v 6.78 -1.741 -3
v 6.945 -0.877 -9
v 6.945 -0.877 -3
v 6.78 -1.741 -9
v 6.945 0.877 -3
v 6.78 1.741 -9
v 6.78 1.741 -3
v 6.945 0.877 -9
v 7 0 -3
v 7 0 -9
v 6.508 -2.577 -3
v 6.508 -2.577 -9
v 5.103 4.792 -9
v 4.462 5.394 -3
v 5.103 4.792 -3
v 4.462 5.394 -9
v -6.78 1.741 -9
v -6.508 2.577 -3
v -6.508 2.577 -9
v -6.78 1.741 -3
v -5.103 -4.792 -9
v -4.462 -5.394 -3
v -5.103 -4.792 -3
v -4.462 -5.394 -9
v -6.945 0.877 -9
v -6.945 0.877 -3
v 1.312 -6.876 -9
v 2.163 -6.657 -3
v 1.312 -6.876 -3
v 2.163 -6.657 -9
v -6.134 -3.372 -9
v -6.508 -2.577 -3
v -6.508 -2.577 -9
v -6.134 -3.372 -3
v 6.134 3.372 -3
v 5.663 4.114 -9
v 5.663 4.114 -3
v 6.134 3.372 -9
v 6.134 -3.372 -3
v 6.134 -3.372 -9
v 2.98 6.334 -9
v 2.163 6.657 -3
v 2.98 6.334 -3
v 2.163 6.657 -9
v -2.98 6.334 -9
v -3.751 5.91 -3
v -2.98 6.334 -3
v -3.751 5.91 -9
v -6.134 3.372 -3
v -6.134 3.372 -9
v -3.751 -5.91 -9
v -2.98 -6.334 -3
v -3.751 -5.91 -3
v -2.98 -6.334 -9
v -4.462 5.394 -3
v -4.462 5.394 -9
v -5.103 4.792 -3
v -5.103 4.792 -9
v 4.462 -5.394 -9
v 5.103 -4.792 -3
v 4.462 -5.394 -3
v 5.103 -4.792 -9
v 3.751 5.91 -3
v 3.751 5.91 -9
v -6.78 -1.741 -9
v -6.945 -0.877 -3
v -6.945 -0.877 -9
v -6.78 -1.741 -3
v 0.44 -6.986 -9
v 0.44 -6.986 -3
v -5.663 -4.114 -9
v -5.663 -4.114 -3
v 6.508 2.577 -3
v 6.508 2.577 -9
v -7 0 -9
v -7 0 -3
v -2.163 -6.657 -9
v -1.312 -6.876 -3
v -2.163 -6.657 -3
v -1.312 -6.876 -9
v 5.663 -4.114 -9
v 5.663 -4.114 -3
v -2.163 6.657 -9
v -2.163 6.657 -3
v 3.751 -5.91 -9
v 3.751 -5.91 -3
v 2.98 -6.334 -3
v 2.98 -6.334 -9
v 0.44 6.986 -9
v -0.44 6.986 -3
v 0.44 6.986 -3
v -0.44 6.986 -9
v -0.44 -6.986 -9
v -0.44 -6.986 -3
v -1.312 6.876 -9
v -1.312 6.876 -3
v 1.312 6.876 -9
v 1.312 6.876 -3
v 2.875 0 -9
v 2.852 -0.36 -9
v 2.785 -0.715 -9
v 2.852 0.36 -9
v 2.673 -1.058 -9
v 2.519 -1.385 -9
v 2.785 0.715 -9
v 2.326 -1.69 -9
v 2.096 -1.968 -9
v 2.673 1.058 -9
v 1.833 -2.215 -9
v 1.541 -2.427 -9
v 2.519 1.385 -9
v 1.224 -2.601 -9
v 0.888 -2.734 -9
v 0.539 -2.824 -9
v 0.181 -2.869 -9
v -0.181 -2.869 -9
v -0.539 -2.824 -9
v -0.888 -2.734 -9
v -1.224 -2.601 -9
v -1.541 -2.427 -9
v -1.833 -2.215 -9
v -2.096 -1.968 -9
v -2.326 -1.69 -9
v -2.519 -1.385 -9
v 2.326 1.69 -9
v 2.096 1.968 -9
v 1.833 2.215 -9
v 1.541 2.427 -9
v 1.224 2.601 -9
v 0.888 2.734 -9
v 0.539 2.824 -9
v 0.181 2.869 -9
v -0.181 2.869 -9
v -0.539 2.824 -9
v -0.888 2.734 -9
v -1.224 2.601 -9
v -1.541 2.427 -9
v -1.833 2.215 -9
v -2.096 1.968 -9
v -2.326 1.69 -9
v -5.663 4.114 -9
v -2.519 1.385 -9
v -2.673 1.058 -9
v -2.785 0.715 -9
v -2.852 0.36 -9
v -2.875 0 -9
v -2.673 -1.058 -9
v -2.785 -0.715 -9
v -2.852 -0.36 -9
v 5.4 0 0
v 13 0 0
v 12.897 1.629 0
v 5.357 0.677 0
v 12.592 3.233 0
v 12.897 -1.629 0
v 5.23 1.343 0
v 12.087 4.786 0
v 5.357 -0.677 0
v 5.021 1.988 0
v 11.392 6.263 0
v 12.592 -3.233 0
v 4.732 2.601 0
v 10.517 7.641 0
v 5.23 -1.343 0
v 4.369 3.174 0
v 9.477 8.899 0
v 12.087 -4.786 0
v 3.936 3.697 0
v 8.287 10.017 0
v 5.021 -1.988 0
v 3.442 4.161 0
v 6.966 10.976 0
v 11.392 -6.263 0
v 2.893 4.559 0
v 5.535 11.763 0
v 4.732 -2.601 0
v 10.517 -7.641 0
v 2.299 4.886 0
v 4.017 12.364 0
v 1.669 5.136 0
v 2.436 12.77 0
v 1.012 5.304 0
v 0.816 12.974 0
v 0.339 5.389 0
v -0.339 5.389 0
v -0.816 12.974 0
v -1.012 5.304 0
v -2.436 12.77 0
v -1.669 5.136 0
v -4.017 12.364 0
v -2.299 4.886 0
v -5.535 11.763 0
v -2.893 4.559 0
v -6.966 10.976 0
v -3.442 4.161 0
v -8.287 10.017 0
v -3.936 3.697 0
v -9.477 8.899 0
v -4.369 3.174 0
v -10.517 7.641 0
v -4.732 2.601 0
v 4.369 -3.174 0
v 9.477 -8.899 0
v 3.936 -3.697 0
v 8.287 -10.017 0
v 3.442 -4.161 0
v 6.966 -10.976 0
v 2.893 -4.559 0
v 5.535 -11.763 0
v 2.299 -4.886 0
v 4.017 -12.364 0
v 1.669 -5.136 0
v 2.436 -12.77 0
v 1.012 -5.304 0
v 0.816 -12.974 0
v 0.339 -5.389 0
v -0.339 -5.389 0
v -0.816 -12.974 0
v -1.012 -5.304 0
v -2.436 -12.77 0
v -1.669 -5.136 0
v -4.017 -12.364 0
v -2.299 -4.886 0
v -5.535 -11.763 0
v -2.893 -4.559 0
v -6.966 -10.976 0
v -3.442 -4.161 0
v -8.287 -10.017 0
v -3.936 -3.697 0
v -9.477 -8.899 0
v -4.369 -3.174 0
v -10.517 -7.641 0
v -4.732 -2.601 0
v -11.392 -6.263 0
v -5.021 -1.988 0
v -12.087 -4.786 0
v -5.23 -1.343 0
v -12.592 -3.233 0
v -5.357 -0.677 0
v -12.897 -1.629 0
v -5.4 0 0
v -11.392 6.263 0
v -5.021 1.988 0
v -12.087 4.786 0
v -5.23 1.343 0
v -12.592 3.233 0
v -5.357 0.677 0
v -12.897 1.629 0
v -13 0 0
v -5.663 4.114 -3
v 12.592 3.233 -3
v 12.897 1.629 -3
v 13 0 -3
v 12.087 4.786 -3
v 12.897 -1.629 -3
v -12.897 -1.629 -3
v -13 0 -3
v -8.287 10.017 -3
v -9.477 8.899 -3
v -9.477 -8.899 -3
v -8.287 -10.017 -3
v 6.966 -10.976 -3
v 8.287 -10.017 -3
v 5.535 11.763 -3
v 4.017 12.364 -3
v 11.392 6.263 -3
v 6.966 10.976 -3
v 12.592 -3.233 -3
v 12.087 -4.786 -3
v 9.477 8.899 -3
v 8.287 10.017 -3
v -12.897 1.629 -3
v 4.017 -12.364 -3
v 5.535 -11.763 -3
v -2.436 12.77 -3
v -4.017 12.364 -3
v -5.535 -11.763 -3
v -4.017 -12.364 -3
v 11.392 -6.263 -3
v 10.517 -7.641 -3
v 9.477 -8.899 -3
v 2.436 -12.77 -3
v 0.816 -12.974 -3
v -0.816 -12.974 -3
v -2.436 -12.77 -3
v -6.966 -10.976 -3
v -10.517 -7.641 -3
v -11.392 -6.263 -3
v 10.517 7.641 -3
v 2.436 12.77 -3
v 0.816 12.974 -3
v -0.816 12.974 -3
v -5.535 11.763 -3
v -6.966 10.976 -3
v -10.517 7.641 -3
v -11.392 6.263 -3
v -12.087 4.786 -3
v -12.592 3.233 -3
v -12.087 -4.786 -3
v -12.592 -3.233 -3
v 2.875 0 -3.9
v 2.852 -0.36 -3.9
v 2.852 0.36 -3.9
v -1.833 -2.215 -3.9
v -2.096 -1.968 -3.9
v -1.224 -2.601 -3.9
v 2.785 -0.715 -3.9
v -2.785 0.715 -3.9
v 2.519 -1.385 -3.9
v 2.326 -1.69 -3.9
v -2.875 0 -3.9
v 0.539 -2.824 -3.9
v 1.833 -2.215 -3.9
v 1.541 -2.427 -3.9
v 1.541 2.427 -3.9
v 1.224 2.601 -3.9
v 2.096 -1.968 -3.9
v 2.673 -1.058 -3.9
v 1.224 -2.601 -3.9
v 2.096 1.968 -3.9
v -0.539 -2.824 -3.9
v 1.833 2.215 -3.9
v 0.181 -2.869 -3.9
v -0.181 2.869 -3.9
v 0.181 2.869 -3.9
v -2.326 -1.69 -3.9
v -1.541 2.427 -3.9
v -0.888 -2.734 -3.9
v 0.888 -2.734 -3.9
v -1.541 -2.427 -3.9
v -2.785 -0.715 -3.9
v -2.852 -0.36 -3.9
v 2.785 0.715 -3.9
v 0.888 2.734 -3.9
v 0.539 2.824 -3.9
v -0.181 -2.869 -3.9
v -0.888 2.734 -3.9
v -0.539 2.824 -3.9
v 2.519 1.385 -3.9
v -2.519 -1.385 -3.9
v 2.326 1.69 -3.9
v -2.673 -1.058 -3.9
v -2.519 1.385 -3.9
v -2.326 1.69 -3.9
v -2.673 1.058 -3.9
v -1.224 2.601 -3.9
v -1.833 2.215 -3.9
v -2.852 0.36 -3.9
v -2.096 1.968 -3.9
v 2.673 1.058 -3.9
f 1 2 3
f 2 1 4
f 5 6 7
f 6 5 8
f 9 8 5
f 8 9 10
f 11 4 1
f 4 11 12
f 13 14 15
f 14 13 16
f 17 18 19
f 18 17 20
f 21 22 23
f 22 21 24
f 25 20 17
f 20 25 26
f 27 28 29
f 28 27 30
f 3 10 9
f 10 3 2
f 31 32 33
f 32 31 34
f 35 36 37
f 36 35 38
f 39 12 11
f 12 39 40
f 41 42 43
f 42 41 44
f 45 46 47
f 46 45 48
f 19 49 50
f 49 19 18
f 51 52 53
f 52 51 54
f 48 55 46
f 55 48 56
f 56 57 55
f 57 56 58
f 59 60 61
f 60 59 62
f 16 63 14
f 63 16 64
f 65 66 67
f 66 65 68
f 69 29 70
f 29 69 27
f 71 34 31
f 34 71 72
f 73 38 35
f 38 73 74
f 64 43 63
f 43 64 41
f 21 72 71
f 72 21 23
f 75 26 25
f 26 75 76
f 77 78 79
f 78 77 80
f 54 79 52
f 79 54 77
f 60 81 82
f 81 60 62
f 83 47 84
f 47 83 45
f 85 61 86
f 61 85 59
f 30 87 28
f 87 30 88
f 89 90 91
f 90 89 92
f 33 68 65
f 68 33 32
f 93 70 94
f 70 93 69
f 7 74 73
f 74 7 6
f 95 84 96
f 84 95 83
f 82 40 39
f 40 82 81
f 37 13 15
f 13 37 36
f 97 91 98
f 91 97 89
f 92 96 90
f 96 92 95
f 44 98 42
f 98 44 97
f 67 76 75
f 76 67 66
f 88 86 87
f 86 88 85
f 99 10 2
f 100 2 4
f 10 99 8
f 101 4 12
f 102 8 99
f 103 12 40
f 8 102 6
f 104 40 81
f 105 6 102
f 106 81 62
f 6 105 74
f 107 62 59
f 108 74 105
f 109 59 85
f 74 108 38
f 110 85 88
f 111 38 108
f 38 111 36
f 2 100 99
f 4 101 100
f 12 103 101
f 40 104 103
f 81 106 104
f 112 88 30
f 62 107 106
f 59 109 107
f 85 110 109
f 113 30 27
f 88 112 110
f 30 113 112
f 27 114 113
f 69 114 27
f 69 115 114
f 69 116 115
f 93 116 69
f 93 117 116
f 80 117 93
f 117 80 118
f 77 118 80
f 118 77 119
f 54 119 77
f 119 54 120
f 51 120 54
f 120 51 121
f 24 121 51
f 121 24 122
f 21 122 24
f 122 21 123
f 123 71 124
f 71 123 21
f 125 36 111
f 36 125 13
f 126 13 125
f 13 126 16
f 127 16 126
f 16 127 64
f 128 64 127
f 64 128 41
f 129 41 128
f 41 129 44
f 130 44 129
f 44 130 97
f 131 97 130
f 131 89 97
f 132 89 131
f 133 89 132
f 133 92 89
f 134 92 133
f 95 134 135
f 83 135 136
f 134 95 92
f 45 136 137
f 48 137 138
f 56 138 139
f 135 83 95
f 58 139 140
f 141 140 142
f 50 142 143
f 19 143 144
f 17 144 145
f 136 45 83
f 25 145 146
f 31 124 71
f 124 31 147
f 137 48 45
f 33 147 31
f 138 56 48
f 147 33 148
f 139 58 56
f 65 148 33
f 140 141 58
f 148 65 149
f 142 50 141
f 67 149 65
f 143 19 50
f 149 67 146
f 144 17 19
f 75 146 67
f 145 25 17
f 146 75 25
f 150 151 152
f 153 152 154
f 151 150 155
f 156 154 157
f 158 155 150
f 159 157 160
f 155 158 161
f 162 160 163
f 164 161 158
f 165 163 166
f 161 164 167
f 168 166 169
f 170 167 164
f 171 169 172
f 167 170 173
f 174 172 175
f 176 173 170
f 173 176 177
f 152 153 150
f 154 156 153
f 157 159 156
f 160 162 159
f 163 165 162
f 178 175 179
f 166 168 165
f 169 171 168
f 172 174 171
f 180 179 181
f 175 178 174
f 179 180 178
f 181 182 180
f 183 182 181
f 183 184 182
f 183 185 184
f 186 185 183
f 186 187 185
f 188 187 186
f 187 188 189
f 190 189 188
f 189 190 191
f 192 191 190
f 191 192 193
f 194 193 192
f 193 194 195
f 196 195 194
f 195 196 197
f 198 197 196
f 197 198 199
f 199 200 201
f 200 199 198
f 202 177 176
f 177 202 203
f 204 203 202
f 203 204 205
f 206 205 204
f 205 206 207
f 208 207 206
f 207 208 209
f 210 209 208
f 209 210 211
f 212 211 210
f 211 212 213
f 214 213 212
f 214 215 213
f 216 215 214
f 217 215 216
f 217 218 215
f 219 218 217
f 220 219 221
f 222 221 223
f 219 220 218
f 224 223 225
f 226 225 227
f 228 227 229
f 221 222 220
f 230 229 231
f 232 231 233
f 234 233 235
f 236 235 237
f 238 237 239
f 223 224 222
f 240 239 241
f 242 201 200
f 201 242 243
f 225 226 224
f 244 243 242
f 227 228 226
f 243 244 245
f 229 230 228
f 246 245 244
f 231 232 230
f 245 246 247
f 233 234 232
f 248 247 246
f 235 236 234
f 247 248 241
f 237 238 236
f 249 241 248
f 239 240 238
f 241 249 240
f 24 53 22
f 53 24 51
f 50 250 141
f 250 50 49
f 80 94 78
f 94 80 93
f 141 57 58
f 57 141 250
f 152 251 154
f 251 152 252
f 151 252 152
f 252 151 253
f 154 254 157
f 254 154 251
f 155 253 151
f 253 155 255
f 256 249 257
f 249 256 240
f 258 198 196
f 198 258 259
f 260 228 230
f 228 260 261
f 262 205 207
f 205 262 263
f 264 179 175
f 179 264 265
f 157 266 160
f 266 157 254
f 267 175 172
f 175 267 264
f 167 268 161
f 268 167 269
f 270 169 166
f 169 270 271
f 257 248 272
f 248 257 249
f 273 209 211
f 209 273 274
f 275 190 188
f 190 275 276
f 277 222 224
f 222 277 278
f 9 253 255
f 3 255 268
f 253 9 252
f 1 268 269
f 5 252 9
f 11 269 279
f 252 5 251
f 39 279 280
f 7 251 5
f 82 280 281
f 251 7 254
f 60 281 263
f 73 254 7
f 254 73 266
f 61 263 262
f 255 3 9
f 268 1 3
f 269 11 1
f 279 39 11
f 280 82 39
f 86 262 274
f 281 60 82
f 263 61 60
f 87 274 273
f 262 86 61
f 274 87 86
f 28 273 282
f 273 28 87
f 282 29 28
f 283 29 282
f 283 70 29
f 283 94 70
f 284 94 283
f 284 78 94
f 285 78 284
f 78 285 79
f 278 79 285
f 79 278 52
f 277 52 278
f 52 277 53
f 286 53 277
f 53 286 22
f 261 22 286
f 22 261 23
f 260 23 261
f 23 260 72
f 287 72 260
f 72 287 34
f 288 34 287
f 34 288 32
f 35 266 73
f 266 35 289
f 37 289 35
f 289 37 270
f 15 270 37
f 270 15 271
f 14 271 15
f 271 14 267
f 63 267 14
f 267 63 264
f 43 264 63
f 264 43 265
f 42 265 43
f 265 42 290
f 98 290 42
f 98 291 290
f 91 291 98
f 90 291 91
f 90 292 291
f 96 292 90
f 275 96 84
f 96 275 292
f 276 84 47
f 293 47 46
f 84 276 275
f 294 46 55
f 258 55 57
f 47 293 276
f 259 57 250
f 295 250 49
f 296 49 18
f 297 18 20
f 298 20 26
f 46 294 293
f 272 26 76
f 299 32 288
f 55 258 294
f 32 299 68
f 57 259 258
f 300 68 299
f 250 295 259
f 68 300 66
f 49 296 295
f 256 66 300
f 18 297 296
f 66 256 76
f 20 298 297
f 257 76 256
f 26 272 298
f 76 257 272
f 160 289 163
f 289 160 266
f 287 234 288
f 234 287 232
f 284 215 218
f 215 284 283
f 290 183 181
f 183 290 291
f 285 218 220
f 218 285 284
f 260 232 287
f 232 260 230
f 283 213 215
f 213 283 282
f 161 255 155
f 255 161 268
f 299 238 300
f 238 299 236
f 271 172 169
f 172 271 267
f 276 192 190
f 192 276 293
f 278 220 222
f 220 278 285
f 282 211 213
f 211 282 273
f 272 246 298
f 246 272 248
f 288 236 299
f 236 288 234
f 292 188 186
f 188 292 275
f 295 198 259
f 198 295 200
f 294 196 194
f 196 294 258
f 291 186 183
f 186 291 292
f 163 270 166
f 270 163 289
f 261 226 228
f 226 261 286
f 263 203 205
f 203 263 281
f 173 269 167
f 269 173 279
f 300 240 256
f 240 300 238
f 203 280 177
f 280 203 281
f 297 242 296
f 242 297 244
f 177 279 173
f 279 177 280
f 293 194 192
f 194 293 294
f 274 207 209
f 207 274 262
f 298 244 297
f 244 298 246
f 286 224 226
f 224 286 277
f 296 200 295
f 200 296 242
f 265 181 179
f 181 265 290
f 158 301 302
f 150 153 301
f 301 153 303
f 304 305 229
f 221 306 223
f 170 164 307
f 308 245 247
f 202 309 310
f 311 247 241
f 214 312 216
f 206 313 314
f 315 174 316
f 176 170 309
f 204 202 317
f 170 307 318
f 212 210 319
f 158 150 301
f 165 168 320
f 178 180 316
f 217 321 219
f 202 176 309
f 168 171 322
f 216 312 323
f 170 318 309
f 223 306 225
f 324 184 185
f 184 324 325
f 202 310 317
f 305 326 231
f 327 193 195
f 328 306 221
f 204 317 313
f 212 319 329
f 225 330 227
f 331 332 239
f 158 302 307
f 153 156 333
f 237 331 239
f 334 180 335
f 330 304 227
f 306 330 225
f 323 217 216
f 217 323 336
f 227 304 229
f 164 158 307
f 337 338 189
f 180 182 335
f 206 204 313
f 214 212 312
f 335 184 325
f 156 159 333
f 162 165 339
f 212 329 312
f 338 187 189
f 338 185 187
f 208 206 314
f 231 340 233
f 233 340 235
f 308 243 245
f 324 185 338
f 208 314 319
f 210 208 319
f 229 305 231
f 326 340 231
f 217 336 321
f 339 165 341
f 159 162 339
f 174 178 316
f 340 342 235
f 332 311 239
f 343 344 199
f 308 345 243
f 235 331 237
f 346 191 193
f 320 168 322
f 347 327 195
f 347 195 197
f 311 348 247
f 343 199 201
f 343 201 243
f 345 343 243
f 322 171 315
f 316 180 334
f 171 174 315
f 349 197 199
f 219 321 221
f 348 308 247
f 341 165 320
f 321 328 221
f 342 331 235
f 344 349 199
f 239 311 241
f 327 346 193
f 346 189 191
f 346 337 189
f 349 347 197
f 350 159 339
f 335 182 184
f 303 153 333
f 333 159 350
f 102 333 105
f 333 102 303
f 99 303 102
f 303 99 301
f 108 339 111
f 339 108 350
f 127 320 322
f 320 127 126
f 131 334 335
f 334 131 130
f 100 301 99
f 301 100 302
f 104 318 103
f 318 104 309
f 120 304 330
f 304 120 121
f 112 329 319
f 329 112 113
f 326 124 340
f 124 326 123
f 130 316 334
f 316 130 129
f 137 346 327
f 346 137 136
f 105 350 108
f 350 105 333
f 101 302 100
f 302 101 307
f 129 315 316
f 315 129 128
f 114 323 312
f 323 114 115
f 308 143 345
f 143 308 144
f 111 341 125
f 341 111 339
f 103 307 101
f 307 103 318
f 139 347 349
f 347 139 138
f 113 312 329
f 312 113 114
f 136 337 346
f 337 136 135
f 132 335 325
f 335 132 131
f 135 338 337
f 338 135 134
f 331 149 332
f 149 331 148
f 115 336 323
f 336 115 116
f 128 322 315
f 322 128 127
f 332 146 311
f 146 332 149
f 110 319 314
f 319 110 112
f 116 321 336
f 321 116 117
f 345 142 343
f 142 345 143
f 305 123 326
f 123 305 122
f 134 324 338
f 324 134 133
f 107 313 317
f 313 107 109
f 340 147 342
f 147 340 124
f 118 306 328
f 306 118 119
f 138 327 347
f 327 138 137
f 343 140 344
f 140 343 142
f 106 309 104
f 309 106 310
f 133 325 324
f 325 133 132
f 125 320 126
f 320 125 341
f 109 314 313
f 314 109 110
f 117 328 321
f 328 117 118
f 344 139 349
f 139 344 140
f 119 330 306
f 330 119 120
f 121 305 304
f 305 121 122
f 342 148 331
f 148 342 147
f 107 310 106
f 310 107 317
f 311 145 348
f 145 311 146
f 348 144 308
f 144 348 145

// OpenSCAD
$fn = 50;


difference() {
	union() {
		translate(v = [0, 0, -9.0000000000]) {
			cylinder(h = 9, r = 7.0000000000);
		}
		translate(v = [0, 0, -3.0000000000]) {
			cylinder(h = 3, r = 13.0000000000);
		}
	}
	union() {
		translate(v = [0, 0, 0]) {
			rotate(a = [0, 0, 0]) {
				difference() {
					union() {
						#translate(v = [0, 0, -9.0000000000]) {
							cylinder(h = 9, r = 2.6000000000);
						}
						#translate(v = [0, 0, -3.9000000000]) {
							cylinder(h = 3.9000000000, r = 7.0000000000, r1 = 2.8750000000, r2 = 5.4000000000);
						}
						#translate(v = [0, 0, -9.0000000000]) {
							cylinder(h = 9, r = 2.8750000000);
						}
						#translate(v = [0, 0, -9.0000000000]) {
							cylinder(h = 9, r = 2.6000000000);
						}
					}
					union();
				}
			}
		}
	}
}
